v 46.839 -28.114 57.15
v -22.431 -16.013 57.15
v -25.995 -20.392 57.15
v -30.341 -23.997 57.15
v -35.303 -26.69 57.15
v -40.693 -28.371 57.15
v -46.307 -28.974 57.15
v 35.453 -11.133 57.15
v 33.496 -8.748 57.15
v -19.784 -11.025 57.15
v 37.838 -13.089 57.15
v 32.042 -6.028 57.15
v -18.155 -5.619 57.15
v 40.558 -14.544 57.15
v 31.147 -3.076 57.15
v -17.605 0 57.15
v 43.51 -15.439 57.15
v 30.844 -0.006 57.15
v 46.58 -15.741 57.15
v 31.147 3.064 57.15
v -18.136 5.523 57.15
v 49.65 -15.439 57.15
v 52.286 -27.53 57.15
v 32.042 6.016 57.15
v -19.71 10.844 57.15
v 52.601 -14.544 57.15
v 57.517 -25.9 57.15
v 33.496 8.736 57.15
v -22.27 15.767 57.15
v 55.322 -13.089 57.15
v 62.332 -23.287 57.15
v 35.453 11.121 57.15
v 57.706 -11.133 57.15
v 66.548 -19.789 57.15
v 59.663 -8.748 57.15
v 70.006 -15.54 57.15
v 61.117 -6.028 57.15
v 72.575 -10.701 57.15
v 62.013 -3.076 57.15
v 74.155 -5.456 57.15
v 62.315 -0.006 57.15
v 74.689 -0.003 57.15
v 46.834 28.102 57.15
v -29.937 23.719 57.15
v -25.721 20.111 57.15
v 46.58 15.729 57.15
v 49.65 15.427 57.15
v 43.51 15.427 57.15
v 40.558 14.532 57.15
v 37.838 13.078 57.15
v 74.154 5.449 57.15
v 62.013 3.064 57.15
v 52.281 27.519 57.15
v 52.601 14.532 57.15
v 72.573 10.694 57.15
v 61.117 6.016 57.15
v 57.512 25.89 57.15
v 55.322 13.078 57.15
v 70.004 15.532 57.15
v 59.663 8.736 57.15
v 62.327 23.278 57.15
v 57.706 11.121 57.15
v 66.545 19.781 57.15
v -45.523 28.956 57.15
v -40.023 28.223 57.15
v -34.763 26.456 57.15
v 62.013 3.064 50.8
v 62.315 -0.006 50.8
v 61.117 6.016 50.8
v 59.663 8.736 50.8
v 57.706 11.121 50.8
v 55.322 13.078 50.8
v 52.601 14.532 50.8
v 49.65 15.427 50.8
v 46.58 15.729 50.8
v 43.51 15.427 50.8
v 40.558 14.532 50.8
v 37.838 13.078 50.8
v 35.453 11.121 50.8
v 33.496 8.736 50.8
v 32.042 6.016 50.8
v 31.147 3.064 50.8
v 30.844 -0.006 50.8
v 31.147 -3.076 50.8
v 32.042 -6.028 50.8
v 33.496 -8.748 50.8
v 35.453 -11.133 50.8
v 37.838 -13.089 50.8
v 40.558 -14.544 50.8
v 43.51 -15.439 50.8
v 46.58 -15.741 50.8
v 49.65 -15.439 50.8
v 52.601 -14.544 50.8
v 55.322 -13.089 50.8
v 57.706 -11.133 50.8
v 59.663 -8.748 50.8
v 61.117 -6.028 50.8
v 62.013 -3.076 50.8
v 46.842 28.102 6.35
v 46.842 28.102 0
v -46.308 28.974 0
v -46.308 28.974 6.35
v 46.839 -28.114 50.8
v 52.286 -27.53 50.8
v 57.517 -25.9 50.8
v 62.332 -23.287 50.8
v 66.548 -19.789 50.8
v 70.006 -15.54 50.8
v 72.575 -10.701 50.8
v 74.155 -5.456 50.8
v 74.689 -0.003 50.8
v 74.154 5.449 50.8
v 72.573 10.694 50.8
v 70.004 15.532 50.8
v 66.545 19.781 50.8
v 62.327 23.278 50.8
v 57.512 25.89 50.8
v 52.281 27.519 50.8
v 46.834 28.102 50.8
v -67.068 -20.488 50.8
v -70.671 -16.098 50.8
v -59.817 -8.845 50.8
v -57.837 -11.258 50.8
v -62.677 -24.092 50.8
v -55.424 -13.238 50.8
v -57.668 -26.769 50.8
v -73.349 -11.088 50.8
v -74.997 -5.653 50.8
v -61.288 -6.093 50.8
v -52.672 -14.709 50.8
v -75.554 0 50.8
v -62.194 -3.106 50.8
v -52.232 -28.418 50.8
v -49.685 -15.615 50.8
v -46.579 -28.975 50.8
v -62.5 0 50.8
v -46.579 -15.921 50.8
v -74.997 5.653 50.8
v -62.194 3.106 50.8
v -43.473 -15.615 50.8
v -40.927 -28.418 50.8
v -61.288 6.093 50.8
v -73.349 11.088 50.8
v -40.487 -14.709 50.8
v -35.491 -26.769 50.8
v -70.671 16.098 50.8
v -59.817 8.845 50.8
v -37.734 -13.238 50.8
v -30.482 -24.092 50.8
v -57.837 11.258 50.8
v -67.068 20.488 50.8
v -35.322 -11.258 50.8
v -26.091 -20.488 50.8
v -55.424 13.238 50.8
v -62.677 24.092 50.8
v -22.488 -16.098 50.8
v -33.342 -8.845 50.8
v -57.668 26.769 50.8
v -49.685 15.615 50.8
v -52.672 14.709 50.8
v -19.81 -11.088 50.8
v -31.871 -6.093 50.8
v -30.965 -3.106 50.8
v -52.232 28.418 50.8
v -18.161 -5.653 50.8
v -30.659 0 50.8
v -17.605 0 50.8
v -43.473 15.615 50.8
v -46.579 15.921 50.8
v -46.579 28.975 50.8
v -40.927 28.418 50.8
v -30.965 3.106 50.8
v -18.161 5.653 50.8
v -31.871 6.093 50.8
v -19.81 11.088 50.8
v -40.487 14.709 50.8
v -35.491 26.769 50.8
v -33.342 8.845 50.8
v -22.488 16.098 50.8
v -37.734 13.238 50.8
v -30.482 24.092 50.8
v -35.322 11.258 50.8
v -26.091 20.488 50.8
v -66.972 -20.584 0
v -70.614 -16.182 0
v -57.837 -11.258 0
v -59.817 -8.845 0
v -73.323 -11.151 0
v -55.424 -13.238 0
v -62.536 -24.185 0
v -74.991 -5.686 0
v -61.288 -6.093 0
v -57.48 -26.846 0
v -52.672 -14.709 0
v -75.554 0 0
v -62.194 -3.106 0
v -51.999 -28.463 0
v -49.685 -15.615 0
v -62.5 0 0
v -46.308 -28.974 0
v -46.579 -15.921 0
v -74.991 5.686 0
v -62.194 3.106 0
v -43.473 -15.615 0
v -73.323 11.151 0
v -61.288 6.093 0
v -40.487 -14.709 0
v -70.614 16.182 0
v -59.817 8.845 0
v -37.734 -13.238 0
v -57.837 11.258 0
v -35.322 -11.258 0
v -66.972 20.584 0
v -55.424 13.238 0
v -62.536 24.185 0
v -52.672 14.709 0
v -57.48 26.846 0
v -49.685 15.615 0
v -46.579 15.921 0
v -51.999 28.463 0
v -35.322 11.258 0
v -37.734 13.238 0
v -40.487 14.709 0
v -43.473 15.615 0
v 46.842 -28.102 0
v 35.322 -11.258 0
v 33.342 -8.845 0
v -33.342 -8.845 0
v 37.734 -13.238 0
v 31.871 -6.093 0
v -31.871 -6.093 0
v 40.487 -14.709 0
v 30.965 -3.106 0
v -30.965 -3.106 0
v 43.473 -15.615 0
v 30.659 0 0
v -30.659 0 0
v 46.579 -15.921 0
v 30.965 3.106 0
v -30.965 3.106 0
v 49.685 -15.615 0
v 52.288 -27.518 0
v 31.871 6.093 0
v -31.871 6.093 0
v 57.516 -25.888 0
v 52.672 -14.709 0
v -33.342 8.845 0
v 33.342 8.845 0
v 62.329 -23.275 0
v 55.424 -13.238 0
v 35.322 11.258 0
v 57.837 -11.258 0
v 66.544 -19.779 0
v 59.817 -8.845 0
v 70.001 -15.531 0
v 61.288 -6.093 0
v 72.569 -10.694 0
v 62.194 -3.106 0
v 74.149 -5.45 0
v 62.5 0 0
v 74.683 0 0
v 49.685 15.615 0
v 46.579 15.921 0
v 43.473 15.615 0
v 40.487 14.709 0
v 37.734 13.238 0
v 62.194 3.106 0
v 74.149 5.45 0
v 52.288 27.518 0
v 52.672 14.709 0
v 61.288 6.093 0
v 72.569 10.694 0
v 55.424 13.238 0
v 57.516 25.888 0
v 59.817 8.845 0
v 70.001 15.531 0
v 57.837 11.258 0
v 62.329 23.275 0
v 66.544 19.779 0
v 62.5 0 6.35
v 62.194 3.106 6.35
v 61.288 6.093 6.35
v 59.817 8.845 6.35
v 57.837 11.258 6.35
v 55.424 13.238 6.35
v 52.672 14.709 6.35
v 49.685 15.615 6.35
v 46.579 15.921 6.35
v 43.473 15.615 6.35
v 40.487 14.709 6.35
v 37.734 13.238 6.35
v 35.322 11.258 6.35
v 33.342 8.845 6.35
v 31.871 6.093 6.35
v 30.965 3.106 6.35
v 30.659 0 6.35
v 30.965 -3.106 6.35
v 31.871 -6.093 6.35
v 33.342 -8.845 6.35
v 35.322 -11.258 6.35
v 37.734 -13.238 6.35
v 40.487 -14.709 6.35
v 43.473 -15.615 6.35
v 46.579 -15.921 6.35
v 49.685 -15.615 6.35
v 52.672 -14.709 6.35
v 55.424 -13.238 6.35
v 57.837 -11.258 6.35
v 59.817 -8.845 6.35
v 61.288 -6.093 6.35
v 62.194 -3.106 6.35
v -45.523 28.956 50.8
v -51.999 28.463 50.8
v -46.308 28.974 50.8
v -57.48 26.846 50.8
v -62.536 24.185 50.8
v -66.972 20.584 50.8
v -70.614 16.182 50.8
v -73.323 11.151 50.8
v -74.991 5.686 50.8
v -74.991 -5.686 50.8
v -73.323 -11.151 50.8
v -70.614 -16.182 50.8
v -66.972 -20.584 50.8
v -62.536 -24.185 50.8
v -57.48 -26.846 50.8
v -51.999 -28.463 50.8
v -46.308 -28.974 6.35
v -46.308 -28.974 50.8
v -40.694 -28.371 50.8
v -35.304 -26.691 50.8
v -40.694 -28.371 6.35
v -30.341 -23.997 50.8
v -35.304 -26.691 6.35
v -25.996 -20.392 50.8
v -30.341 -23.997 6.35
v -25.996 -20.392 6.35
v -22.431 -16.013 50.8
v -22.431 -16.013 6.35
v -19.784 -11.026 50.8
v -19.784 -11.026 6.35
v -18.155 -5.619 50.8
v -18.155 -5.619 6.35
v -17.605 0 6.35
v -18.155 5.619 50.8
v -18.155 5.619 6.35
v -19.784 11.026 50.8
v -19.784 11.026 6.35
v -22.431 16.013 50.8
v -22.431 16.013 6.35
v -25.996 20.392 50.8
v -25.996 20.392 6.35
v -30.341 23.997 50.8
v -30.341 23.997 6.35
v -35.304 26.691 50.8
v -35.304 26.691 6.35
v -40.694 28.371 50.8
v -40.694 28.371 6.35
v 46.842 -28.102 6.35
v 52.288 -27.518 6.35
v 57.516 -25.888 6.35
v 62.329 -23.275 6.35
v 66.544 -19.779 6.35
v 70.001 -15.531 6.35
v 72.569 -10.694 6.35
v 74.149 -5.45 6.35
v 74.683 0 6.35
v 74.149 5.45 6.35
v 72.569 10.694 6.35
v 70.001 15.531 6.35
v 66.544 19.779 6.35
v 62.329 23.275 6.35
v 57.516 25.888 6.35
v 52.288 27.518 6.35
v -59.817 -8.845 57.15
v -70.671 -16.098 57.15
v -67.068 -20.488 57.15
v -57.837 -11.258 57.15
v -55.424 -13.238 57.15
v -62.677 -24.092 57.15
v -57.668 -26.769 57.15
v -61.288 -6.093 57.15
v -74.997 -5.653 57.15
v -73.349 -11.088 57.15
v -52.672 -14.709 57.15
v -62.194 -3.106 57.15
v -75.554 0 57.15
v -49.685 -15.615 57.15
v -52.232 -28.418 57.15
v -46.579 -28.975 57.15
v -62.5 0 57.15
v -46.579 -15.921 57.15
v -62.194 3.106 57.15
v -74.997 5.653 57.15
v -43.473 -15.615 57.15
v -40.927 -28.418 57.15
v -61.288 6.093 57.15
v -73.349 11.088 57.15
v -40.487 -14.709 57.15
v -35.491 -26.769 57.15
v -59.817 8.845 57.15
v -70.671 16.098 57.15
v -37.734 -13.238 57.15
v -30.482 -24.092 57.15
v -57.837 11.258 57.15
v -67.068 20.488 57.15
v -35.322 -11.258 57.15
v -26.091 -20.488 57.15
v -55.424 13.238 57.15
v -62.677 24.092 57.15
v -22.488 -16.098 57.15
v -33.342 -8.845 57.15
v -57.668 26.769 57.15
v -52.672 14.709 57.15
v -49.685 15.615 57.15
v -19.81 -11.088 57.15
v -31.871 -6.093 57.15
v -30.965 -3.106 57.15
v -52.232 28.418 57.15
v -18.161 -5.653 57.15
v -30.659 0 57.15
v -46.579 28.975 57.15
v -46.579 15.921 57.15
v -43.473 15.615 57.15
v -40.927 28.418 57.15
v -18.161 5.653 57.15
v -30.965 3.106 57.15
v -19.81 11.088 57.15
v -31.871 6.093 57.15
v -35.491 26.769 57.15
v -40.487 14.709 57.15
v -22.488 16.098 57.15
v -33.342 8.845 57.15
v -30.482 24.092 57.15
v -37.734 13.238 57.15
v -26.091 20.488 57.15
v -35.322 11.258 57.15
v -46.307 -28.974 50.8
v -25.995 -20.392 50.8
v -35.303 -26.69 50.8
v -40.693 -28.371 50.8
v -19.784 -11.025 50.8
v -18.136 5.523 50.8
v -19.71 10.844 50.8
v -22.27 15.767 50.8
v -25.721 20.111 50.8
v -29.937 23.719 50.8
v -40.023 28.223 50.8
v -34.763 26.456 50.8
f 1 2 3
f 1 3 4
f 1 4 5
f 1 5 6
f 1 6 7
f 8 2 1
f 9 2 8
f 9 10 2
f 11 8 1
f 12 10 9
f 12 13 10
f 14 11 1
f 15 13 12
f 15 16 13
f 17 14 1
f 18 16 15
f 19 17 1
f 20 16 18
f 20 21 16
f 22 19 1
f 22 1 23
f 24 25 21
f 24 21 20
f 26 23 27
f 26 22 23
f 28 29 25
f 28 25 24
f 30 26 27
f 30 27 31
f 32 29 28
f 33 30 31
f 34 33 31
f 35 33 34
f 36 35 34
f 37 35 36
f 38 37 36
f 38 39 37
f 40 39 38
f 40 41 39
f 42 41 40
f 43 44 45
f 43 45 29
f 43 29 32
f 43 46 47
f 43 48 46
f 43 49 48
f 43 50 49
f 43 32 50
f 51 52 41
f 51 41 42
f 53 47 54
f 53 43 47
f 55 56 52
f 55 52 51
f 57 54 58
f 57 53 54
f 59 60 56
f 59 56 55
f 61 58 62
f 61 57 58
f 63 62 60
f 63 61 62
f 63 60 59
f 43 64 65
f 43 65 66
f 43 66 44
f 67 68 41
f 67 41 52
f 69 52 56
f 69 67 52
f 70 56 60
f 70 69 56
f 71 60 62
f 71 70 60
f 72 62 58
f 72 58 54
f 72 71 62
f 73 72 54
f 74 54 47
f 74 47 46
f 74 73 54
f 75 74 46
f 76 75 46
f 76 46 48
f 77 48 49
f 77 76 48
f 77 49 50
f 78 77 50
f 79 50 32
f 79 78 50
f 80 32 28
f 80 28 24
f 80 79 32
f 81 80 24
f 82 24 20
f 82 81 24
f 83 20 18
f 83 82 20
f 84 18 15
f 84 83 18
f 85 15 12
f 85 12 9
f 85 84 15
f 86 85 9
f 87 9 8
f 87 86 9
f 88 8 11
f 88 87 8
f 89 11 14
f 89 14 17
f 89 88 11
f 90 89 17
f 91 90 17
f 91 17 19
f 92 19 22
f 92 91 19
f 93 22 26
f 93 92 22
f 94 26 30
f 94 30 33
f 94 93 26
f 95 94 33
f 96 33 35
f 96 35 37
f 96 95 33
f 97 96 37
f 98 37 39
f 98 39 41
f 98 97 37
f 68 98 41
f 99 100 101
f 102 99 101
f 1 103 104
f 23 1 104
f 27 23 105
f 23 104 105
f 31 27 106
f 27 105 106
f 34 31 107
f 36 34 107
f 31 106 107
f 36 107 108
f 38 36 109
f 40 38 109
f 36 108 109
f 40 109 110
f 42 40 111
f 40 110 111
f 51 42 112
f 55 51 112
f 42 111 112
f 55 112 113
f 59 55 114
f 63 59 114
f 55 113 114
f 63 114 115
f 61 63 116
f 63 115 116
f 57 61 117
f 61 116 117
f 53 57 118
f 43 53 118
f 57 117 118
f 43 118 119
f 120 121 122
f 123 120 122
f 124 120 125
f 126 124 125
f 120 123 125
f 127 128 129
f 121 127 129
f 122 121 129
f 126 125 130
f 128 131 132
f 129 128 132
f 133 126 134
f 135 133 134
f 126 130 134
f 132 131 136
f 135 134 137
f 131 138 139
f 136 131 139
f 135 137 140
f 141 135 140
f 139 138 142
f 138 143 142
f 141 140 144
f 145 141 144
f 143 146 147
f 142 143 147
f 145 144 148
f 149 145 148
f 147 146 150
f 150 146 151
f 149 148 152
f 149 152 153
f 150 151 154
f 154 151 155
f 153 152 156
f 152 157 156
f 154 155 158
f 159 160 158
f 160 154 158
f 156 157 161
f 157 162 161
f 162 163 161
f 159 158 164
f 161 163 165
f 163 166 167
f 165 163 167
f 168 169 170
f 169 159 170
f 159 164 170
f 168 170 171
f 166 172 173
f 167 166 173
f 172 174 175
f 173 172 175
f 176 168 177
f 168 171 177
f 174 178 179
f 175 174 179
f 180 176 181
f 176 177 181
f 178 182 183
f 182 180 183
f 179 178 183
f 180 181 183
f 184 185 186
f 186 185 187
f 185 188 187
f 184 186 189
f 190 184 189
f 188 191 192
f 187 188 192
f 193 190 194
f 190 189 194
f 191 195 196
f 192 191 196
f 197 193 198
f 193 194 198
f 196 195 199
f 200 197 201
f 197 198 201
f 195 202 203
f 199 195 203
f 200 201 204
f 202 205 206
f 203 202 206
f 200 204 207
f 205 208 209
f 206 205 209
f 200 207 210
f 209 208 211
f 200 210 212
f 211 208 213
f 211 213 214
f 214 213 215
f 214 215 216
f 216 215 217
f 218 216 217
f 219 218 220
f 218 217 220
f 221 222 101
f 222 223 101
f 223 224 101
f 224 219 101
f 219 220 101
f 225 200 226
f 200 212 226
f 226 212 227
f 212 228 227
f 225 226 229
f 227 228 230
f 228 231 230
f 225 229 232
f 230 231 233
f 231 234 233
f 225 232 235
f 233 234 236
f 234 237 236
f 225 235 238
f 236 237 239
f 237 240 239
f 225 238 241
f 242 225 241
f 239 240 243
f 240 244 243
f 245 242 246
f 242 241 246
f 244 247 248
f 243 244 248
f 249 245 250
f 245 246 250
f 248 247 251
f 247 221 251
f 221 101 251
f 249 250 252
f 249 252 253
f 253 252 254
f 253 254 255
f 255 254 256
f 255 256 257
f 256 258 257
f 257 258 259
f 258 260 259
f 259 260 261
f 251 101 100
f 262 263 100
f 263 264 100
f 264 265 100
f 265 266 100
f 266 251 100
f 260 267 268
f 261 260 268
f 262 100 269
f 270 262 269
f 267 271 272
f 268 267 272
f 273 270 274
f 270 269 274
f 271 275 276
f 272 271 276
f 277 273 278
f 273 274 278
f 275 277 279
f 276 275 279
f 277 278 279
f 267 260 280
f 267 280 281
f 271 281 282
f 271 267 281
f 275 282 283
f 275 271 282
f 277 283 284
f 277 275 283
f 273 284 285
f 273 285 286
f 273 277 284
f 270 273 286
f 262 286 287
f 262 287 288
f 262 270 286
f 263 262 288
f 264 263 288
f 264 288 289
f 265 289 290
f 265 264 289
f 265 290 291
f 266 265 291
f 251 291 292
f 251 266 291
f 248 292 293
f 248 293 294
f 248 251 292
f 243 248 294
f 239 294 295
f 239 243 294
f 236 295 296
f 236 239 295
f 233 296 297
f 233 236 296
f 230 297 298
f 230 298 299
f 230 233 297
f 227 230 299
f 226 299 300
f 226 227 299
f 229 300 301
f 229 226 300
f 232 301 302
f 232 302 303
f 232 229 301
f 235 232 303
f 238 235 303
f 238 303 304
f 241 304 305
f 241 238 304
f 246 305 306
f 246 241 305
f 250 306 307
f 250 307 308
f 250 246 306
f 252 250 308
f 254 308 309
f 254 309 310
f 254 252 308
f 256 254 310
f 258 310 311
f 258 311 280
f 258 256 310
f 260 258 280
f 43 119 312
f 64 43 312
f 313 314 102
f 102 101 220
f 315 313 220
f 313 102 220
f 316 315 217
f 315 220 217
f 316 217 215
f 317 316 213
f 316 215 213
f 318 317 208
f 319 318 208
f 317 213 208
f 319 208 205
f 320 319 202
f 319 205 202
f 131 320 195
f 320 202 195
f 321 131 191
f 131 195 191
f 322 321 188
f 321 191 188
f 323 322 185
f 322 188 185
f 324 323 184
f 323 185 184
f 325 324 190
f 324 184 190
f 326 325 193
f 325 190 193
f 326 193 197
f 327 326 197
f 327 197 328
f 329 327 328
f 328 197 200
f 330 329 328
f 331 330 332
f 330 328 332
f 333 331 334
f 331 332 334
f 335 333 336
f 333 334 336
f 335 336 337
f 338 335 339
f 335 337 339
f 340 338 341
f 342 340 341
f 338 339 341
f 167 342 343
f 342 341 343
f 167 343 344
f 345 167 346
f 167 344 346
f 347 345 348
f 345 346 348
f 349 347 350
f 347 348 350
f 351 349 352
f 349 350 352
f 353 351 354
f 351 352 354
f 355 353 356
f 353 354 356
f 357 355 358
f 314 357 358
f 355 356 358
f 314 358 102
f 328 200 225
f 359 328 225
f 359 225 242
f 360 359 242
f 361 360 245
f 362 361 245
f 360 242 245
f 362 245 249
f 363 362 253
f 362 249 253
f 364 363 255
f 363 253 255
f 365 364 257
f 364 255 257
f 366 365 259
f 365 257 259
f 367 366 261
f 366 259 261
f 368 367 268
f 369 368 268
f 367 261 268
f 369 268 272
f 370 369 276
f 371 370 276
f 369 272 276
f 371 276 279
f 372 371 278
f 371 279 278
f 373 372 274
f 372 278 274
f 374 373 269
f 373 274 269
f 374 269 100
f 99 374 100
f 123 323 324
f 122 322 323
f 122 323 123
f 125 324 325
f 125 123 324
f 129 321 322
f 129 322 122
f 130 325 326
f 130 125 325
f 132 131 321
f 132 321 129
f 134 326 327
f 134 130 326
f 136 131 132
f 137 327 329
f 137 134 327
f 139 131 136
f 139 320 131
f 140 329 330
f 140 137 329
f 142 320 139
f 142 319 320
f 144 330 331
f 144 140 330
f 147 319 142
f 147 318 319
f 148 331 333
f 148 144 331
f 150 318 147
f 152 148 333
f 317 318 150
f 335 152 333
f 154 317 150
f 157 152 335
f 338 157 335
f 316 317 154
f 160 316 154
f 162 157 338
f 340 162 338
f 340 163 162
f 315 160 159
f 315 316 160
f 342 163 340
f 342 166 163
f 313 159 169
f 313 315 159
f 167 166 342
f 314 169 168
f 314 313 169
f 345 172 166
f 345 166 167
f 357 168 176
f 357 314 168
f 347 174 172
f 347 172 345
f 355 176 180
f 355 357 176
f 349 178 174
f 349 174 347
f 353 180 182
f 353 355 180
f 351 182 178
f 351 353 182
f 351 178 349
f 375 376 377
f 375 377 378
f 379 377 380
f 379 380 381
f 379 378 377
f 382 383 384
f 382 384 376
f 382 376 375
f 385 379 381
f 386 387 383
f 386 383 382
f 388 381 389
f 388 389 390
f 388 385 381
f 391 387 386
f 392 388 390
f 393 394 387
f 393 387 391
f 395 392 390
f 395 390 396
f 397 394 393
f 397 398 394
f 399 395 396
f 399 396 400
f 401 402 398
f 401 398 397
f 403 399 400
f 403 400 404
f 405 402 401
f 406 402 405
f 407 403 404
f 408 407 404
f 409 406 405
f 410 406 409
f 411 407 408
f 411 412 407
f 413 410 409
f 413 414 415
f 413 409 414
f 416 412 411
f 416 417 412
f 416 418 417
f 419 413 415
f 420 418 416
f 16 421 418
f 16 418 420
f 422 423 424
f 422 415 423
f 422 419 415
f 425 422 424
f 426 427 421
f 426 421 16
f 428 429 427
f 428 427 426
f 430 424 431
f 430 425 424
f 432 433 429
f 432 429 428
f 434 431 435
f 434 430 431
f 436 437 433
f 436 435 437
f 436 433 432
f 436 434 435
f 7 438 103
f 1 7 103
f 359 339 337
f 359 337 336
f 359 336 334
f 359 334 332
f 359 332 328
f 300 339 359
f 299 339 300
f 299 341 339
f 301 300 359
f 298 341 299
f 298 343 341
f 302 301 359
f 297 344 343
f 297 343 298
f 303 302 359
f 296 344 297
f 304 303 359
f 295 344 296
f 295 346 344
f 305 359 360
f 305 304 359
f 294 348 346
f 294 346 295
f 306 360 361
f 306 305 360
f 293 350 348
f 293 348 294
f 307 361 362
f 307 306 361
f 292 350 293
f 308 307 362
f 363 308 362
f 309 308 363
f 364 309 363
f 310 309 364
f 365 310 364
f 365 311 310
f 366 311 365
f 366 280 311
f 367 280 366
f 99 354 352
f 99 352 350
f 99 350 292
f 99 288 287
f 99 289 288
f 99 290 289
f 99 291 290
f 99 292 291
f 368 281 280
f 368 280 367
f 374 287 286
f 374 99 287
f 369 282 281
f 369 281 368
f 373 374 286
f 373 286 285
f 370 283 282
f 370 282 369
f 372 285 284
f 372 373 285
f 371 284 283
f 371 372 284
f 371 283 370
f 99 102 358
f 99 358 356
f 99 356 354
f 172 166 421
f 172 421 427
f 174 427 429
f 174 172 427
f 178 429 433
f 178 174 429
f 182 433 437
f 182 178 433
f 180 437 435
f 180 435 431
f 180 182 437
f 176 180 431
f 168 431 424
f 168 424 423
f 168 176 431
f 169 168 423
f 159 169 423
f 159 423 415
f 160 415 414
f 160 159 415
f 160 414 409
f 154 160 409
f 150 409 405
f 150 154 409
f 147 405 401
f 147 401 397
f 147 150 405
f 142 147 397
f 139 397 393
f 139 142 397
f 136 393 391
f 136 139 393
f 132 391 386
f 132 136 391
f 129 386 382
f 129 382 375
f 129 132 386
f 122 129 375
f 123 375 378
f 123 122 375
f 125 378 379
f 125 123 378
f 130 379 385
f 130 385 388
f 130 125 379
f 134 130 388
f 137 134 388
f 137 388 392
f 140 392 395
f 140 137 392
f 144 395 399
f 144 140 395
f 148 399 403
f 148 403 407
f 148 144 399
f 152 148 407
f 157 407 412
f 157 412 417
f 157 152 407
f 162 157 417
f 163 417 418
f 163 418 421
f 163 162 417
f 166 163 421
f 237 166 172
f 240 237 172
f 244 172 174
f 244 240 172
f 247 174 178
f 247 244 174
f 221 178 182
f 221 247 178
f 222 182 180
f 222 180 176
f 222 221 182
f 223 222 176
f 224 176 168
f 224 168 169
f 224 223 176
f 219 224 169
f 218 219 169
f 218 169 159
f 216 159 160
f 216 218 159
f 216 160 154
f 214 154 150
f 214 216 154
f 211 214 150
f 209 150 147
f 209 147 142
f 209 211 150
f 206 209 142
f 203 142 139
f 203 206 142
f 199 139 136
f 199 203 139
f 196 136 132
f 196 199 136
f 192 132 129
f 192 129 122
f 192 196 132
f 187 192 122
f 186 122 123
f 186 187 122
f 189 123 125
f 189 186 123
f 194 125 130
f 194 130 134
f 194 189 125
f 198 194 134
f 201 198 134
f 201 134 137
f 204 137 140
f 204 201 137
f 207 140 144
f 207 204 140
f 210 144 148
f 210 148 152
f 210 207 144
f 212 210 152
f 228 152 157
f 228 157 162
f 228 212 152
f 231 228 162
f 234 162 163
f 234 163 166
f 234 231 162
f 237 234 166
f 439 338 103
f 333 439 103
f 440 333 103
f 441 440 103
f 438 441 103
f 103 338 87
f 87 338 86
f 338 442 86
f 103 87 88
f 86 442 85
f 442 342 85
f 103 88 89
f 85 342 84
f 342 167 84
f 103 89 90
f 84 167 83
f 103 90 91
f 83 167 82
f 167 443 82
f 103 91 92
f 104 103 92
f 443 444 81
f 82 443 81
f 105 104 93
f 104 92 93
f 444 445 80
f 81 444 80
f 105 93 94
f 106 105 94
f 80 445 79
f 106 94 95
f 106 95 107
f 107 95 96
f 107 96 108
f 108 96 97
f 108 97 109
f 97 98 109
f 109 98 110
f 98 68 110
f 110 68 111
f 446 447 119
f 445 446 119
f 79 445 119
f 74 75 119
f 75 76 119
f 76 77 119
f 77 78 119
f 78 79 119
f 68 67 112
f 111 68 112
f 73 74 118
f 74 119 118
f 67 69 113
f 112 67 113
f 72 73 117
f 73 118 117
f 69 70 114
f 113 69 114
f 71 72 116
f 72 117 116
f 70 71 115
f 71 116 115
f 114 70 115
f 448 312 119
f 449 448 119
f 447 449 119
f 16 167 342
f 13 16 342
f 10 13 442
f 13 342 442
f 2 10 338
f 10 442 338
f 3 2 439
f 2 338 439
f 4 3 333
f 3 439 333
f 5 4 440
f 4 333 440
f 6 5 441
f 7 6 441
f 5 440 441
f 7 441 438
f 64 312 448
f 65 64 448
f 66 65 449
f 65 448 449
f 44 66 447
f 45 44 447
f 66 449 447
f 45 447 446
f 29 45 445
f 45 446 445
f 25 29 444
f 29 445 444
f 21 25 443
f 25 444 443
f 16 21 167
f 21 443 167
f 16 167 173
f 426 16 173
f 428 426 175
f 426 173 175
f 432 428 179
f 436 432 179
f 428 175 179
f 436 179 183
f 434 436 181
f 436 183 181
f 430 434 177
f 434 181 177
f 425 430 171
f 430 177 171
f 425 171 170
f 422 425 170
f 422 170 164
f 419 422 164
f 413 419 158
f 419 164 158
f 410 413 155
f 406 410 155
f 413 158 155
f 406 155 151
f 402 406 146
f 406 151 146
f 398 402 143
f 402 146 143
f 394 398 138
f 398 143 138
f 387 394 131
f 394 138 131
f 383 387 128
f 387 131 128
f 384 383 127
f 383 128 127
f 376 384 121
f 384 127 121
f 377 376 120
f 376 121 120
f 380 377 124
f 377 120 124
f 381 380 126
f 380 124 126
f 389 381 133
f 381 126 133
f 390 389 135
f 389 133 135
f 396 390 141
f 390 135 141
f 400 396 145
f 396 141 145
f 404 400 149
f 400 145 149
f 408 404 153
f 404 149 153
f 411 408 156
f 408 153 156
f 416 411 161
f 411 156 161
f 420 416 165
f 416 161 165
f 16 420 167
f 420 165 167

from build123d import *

# Parameters (mm, degrees)
F0_R        = 15.920661
F1_DEPTH    = 50.8
F2_DEPTH    = 6.35
F3_R        = 15.735367
F4_DEPTH    = 6.35
F1_FACE_R   = 28.974796
F1_FACE_R_2 = 15.920661
F5_DEPTH    = 6.35


with BuildPart() as f1:
    # F0 (on Top) → F1 (new body)
    with BuildSketch(Plane.XY):
        with BuildLine():
            ThreePointArc((-46.308367, -28.973528), (-17.604609, 0), (-46.308367, 28.973528))
            ThreePointArc((-46.308367, 28.973528), (-75.554202, 0), (-46.308367, -28.973528))
        make_face()
        with Locations((-46.579406, 0)):
            Circle(F0_R, mode=Mode.SUBTRACT)
    extrude(amount=F1_DEPTH)

    # F0 (on Top) → F2 (join)
    with BuildSketch(Plane.XY):
        with BuildLine():
            Line((46.842293, 28.102132), (-46.308367, 28.973528))
            ThreePointArc((-46.308367, 28.973528), (-17.604609, 0), (-46.308367, -28.973528))
            Line((-46.308367, -28.973528), (46.842293, -28.102132))
            ThreePointArc((46.842293, -28.102132), (74.682768, 0), (46.842293, 28.102132))
        make_face()
        with Locations((46.579406, 0)):
            Circle(F0_R, mode=Mode.SUBTRACT)
    extrude(amount=F2_DEPTH)


with BuildPart() as f4:
    # F3 (on face) → F4 (new body)
    with BuildSketch(Plane.XY.offset(50.8)):
        with BuildLine():
            Line((46.83423, 28.101848), (-45.523093, 28.955535))
            ThreePointArc((-45.523093, 28.955535), (-25.721011, 20.111345), (-17.604609, 0))
            ThreePointArc((-17.604609, 0), (-25.995196, -20.391889), (-46.307426, -28.97352))
            Line((-46.307426, -28.97352), (46.839207, -28.113717))
            ThreePointArc((46.839207, -28.113717), (74.688712, -0.003469), (46.83423, 28.101848))
        make_face()
        with Locations((46.579755, -0.005957)):
            Circle(F3_R, mode=Mode.SUBTRACT)
    extrude(amount=F4_DEPTH)


with BuildPart() as f5:
    # F1_face (on face) → F5 (new body)
    with BuildSketch(Plane(origin=(-46.579406, 0, 50.8), x_dir=(1, 0, 0), z_dir=(0, 0, 1))):
        Circle(F1_FACE_R)
        Circle(F1_FACE_R_2, mode=Mode.SUBTRACT)
    extrude(amount=F5_DEPTH)


solid = Compound([f1.part, f4.part, f5.part])
